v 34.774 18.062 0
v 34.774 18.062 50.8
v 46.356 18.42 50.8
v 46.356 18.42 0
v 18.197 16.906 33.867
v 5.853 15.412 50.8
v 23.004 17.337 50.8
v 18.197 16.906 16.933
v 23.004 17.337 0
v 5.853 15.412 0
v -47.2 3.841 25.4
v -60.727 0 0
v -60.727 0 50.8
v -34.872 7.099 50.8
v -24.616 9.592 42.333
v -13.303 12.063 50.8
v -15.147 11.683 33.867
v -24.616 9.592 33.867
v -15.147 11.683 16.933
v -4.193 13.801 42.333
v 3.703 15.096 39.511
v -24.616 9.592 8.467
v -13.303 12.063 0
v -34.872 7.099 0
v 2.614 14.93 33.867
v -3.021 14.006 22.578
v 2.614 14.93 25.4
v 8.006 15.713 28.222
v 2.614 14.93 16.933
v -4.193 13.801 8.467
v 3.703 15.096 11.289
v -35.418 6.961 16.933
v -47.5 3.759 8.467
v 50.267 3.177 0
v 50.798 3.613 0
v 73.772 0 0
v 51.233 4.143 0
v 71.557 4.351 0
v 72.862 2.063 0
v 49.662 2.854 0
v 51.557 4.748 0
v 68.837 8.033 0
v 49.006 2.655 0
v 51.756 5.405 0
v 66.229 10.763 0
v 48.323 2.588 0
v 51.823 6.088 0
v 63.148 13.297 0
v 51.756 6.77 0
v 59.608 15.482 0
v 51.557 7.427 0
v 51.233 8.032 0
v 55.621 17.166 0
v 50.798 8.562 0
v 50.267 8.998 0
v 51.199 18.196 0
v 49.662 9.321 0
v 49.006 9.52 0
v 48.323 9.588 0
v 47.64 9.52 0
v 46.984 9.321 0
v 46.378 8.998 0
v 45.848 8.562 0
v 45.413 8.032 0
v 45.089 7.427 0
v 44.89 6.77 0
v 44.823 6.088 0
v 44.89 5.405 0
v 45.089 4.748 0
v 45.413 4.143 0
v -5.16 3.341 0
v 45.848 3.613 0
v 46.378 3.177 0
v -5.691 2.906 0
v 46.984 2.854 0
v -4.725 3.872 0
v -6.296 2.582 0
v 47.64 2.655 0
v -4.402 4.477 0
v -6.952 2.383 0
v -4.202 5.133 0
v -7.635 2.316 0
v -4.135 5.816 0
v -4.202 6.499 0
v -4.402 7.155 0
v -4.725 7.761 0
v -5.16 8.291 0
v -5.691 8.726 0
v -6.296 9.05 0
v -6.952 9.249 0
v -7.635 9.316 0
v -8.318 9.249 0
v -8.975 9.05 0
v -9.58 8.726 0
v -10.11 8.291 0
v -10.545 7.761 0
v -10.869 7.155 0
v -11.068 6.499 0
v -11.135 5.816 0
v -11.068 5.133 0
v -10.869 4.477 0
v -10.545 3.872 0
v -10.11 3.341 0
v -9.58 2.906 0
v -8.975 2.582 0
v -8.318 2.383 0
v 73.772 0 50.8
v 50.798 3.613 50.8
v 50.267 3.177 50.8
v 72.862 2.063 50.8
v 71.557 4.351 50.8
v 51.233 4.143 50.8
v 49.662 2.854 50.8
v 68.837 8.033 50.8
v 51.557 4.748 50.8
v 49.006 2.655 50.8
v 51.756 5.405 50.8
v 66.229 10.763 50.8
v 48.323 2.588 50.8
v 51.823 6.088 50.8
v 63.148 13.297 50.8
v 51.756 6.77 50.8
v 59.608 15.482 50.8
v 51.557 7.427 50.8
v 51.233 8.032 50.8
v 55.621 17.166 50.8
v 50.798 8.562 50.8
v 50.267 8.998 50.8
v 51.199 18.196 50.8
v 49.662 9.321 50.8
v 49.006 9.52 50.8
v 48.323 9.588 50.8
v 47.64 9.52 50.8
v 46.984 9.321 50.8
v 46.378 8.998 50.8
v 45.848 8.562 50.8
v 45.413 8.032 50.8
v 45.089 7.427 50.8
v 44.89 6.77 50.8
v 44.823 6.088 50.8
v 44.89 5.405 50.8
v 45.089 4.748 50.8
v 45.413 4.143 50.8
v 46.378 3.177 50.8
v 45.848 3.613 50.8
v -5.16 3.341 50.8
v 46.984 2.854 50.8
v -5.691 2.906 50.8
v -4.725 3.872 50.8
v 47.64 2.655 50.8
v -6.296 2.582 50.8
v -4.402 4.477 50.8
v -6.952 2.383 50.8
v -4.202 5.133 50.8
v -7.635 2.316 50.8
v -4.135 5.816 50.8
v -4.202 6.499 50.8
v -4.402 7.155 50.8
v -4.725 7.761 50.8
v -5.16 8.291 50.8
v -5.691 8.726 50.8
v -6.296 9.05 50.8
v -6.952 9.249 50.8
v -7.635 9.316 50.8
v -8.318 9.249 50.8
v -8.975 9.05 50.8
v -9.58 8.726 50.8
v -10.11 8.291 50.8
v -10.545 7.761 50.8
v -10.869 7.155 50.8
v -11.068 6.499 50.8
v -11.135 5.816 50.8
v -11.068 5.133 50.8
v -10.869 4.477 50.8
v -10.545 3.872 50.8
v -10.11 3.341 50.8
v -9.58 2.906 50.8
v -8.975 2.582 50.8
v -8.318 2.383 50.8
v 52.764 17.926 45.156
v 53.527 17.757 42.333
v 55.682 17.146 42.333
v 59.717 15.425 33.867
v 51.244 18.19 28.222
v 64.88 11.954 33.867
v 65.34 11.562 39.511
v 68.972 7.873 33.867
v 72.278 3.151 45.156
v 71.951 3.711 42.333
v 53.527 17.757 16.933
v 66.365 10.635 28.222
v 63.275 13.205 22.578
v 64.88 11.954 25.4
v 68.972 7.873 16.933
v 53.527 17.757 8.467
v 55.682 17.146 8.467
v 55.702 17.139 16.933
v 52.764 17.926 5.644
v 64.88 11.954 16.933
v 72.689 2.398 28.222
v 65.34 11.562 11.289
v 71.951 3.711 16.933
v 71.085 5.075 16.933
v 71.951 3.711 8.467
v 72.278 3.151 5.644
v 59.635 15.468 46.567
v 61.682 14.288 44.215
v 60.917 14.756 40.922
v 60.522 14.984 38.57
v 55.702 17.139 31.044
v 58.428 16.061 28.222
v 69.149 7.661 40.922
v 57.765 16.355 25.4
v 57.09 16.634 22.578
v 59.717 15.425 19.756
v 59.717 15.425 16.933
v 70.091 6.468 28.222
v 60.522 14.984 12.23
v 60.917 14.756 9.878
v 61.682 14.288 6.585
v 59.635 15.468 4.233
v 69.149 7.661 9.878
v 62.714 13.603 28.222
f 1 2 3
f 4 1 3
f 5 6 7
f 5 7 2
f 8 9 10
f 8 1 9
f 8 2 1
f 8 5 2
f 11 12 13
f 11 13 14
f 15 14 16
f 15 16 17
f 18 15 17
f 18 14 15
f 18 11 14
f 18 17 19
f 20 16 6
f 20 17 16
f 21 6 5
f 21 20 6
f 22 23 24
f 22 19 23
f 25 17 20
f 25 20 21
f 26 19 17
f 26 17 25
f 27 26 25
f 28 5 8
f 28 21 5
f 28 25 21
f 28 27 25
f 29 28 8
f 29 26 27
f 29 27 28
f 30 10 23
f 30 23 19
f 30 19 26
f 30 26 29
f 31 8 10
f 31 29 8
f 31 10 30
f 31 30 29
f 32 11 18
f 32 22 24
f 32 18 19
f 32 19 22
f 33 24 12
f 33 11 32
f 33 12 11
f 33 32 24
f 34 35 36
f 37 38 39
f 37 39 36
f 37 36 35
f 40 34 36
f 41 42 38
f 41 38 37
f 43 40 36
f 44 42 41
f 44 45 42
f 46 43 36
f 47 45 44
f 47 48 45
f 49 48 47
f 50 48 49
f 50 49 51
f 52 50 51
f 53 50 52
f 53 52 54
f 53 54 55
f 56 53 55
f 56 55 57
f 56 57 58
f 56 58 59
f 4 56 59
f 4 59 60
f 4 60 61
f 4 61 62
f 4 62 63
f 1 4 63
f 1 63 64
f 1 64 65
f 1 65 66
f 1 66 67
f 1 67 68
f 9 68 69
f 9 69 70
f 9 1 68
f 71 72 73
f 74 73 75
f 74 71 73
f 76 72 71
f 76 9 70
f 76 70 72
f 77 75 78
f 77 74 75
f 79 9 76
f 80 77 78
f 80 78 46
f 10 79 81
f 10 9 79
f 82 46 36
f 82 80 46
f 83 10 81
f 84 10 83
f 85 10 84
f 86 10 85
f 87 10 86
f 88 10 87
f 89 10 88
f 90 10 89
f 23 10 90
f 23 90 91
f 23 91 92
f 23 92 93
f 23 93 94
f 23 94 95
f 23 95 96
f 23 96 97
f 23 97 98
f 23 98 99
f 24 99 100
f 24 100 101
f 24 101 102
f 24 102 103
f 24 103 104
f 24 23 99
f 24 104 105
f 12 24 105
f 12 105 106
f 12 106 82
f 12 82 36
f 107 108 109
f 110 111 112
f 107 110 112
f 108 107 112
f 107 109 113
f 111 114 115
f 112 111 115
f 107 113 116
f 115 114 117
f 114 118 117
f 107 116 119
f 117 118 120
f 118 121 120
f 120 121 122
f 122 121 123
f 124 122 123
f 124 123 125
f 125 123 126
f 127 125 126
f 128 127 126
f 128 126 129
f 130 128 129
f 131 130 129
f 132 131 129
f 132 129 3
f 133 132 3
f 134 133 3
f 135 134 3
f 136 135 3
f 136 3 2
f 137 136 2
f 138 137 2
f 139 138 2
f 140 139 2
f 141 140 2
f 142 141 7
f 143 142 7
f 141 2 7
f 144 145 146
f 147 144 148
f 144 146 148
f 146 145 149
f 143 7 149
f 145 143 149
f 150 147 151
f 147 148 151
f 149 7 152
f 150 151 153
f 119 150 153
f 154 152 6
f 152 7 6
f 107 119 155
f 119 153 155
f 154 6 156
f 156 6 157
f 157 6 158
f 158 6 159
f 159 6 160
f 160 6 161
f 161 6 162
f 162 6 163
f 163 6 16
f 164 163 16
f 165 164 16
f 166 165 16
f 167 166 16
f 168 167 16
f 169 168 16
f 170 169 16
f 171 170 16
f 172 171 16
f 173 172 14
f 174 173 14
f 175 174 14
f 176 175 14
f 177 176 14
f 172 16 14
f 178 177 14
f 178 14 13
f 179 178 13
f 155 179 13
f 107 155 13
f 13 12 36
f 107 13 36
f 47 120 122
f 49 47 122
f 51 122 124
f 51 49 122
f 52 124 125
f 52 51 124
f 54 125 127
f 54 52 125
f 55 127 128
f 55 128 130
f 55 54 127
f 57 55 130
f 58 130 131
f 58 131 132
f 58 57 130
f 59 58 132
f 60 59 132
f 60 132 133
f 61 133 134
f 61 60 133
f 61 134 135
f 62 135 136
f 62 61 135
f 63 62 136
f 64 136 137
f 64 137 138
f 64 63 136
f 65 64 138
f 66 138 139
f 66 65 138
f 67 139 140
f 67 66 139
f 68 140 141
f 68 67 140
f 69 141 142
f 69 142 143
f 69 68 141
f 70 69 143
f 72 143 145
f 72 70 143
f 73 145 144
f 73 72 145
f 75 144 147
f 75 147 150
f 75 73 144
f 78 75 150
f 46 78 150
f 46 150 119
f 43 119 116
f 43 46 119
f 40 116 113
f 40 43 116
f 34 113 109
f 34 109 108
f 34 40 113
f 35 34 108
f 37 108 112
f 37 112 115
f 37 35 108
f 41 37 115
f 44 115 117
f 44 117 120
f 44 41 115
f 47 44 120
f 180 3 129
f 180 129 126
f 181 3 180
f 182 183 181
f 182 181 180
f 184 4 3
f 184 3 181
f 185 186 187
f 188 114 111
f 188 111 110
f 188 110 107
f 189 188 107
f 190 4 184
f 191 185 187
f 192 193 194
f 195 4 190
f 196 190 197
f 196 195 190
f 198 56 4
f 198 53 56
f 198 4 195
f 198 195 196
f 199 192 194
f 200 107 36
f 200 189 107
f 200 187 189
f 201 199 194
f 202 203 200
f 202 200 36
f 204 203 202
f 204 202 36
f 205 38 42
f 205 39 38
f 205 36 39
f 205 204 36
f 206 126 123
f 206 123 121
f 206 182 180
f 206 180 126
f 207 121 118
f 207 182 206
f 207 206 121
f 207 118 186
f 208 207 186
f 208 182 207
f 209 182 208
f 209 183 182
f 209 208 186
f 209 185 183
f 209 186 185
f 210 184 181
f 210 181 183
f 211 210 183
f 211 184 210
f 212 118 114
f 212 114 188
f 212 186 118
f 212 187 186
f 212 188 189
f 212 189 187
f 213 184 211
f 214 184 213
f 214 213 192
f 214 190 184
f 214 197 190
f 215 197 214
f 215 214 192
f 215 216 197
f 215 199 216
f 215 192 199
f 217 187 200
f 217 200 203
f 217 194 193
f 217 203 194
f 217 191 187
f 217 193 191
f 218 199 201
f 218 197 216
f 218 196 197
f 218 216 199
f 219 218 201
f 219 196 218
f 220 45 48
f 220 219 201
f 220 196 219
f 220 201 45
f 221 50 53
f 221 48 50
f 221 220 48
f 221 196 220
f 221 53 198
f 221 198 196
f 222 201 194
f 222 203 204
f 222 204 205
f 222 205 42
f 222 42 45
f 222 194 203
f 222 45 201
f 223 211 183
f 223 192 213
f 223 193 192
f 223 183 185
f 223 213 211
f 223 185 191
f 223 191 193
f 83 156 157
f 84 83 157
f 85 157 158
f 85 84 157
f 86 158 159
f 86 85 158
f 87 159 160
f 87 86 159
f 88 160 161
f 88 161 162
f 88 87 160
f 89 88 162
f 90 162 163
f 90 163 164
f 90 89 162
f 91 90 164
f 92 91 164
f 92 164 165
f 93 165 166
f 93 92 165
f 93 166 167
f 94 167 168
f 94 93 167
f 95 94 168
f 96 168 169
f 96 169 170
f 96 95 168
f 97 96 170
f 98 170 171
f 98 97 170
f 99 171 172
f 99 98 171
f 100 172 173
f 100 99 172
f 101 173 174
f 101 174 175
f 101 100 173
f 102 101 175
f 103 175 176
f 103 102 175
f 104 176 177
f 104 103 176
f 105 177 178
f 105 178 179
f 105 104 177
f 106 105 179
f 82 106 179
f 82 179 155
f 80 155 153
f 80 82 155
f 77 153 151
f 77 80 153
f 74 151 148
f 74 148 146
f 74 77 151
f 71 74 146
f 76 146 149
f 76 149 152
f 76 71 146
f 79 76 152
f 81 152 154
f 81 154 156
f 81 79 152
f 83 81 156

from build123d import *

# Parameters (mm, degrees)
F0_R     = 3.5
F1_DEPTH = 50.8


with BuildPart() as f1:
    # F0 (on Top) → F1 (new body)
    with BuildSketch(Plane.XY):
        with BuildLine():
            add(Edge.make_bspline(
                [(-60.727015, 0), (-6.678293, 15.829317), (18.438485, 17.843956), (46.355639, 18.419569)],
                knots=[0, 0, 0, 0, 108.655305, 108.655305, 108.655305, 108.655305], degree=3))
            Line((-60.727015, 0), (73.772119, 0))
            add(Edge.make_bspline(
                [(46.355639, 18.419569), (61.652482, 19.117288), (71.317069, 6.619532), (73.772119, 0)],
                knots=[0, 0, 0, 0, 33.029441, 33.029441, 33.029441, 33.029441], degree=3))
        make_face()
        with Locations((-7.635186, 5.816073)):
            Circle(F0_R, mode=Mode.SUBTRACT)
        with Locations((48.322952, 6.087539)):
            Circle(F0_R, mode=Mode.SUBTRACT)
    extrude(amount=F1_DEPTH)


solid = f1.part
